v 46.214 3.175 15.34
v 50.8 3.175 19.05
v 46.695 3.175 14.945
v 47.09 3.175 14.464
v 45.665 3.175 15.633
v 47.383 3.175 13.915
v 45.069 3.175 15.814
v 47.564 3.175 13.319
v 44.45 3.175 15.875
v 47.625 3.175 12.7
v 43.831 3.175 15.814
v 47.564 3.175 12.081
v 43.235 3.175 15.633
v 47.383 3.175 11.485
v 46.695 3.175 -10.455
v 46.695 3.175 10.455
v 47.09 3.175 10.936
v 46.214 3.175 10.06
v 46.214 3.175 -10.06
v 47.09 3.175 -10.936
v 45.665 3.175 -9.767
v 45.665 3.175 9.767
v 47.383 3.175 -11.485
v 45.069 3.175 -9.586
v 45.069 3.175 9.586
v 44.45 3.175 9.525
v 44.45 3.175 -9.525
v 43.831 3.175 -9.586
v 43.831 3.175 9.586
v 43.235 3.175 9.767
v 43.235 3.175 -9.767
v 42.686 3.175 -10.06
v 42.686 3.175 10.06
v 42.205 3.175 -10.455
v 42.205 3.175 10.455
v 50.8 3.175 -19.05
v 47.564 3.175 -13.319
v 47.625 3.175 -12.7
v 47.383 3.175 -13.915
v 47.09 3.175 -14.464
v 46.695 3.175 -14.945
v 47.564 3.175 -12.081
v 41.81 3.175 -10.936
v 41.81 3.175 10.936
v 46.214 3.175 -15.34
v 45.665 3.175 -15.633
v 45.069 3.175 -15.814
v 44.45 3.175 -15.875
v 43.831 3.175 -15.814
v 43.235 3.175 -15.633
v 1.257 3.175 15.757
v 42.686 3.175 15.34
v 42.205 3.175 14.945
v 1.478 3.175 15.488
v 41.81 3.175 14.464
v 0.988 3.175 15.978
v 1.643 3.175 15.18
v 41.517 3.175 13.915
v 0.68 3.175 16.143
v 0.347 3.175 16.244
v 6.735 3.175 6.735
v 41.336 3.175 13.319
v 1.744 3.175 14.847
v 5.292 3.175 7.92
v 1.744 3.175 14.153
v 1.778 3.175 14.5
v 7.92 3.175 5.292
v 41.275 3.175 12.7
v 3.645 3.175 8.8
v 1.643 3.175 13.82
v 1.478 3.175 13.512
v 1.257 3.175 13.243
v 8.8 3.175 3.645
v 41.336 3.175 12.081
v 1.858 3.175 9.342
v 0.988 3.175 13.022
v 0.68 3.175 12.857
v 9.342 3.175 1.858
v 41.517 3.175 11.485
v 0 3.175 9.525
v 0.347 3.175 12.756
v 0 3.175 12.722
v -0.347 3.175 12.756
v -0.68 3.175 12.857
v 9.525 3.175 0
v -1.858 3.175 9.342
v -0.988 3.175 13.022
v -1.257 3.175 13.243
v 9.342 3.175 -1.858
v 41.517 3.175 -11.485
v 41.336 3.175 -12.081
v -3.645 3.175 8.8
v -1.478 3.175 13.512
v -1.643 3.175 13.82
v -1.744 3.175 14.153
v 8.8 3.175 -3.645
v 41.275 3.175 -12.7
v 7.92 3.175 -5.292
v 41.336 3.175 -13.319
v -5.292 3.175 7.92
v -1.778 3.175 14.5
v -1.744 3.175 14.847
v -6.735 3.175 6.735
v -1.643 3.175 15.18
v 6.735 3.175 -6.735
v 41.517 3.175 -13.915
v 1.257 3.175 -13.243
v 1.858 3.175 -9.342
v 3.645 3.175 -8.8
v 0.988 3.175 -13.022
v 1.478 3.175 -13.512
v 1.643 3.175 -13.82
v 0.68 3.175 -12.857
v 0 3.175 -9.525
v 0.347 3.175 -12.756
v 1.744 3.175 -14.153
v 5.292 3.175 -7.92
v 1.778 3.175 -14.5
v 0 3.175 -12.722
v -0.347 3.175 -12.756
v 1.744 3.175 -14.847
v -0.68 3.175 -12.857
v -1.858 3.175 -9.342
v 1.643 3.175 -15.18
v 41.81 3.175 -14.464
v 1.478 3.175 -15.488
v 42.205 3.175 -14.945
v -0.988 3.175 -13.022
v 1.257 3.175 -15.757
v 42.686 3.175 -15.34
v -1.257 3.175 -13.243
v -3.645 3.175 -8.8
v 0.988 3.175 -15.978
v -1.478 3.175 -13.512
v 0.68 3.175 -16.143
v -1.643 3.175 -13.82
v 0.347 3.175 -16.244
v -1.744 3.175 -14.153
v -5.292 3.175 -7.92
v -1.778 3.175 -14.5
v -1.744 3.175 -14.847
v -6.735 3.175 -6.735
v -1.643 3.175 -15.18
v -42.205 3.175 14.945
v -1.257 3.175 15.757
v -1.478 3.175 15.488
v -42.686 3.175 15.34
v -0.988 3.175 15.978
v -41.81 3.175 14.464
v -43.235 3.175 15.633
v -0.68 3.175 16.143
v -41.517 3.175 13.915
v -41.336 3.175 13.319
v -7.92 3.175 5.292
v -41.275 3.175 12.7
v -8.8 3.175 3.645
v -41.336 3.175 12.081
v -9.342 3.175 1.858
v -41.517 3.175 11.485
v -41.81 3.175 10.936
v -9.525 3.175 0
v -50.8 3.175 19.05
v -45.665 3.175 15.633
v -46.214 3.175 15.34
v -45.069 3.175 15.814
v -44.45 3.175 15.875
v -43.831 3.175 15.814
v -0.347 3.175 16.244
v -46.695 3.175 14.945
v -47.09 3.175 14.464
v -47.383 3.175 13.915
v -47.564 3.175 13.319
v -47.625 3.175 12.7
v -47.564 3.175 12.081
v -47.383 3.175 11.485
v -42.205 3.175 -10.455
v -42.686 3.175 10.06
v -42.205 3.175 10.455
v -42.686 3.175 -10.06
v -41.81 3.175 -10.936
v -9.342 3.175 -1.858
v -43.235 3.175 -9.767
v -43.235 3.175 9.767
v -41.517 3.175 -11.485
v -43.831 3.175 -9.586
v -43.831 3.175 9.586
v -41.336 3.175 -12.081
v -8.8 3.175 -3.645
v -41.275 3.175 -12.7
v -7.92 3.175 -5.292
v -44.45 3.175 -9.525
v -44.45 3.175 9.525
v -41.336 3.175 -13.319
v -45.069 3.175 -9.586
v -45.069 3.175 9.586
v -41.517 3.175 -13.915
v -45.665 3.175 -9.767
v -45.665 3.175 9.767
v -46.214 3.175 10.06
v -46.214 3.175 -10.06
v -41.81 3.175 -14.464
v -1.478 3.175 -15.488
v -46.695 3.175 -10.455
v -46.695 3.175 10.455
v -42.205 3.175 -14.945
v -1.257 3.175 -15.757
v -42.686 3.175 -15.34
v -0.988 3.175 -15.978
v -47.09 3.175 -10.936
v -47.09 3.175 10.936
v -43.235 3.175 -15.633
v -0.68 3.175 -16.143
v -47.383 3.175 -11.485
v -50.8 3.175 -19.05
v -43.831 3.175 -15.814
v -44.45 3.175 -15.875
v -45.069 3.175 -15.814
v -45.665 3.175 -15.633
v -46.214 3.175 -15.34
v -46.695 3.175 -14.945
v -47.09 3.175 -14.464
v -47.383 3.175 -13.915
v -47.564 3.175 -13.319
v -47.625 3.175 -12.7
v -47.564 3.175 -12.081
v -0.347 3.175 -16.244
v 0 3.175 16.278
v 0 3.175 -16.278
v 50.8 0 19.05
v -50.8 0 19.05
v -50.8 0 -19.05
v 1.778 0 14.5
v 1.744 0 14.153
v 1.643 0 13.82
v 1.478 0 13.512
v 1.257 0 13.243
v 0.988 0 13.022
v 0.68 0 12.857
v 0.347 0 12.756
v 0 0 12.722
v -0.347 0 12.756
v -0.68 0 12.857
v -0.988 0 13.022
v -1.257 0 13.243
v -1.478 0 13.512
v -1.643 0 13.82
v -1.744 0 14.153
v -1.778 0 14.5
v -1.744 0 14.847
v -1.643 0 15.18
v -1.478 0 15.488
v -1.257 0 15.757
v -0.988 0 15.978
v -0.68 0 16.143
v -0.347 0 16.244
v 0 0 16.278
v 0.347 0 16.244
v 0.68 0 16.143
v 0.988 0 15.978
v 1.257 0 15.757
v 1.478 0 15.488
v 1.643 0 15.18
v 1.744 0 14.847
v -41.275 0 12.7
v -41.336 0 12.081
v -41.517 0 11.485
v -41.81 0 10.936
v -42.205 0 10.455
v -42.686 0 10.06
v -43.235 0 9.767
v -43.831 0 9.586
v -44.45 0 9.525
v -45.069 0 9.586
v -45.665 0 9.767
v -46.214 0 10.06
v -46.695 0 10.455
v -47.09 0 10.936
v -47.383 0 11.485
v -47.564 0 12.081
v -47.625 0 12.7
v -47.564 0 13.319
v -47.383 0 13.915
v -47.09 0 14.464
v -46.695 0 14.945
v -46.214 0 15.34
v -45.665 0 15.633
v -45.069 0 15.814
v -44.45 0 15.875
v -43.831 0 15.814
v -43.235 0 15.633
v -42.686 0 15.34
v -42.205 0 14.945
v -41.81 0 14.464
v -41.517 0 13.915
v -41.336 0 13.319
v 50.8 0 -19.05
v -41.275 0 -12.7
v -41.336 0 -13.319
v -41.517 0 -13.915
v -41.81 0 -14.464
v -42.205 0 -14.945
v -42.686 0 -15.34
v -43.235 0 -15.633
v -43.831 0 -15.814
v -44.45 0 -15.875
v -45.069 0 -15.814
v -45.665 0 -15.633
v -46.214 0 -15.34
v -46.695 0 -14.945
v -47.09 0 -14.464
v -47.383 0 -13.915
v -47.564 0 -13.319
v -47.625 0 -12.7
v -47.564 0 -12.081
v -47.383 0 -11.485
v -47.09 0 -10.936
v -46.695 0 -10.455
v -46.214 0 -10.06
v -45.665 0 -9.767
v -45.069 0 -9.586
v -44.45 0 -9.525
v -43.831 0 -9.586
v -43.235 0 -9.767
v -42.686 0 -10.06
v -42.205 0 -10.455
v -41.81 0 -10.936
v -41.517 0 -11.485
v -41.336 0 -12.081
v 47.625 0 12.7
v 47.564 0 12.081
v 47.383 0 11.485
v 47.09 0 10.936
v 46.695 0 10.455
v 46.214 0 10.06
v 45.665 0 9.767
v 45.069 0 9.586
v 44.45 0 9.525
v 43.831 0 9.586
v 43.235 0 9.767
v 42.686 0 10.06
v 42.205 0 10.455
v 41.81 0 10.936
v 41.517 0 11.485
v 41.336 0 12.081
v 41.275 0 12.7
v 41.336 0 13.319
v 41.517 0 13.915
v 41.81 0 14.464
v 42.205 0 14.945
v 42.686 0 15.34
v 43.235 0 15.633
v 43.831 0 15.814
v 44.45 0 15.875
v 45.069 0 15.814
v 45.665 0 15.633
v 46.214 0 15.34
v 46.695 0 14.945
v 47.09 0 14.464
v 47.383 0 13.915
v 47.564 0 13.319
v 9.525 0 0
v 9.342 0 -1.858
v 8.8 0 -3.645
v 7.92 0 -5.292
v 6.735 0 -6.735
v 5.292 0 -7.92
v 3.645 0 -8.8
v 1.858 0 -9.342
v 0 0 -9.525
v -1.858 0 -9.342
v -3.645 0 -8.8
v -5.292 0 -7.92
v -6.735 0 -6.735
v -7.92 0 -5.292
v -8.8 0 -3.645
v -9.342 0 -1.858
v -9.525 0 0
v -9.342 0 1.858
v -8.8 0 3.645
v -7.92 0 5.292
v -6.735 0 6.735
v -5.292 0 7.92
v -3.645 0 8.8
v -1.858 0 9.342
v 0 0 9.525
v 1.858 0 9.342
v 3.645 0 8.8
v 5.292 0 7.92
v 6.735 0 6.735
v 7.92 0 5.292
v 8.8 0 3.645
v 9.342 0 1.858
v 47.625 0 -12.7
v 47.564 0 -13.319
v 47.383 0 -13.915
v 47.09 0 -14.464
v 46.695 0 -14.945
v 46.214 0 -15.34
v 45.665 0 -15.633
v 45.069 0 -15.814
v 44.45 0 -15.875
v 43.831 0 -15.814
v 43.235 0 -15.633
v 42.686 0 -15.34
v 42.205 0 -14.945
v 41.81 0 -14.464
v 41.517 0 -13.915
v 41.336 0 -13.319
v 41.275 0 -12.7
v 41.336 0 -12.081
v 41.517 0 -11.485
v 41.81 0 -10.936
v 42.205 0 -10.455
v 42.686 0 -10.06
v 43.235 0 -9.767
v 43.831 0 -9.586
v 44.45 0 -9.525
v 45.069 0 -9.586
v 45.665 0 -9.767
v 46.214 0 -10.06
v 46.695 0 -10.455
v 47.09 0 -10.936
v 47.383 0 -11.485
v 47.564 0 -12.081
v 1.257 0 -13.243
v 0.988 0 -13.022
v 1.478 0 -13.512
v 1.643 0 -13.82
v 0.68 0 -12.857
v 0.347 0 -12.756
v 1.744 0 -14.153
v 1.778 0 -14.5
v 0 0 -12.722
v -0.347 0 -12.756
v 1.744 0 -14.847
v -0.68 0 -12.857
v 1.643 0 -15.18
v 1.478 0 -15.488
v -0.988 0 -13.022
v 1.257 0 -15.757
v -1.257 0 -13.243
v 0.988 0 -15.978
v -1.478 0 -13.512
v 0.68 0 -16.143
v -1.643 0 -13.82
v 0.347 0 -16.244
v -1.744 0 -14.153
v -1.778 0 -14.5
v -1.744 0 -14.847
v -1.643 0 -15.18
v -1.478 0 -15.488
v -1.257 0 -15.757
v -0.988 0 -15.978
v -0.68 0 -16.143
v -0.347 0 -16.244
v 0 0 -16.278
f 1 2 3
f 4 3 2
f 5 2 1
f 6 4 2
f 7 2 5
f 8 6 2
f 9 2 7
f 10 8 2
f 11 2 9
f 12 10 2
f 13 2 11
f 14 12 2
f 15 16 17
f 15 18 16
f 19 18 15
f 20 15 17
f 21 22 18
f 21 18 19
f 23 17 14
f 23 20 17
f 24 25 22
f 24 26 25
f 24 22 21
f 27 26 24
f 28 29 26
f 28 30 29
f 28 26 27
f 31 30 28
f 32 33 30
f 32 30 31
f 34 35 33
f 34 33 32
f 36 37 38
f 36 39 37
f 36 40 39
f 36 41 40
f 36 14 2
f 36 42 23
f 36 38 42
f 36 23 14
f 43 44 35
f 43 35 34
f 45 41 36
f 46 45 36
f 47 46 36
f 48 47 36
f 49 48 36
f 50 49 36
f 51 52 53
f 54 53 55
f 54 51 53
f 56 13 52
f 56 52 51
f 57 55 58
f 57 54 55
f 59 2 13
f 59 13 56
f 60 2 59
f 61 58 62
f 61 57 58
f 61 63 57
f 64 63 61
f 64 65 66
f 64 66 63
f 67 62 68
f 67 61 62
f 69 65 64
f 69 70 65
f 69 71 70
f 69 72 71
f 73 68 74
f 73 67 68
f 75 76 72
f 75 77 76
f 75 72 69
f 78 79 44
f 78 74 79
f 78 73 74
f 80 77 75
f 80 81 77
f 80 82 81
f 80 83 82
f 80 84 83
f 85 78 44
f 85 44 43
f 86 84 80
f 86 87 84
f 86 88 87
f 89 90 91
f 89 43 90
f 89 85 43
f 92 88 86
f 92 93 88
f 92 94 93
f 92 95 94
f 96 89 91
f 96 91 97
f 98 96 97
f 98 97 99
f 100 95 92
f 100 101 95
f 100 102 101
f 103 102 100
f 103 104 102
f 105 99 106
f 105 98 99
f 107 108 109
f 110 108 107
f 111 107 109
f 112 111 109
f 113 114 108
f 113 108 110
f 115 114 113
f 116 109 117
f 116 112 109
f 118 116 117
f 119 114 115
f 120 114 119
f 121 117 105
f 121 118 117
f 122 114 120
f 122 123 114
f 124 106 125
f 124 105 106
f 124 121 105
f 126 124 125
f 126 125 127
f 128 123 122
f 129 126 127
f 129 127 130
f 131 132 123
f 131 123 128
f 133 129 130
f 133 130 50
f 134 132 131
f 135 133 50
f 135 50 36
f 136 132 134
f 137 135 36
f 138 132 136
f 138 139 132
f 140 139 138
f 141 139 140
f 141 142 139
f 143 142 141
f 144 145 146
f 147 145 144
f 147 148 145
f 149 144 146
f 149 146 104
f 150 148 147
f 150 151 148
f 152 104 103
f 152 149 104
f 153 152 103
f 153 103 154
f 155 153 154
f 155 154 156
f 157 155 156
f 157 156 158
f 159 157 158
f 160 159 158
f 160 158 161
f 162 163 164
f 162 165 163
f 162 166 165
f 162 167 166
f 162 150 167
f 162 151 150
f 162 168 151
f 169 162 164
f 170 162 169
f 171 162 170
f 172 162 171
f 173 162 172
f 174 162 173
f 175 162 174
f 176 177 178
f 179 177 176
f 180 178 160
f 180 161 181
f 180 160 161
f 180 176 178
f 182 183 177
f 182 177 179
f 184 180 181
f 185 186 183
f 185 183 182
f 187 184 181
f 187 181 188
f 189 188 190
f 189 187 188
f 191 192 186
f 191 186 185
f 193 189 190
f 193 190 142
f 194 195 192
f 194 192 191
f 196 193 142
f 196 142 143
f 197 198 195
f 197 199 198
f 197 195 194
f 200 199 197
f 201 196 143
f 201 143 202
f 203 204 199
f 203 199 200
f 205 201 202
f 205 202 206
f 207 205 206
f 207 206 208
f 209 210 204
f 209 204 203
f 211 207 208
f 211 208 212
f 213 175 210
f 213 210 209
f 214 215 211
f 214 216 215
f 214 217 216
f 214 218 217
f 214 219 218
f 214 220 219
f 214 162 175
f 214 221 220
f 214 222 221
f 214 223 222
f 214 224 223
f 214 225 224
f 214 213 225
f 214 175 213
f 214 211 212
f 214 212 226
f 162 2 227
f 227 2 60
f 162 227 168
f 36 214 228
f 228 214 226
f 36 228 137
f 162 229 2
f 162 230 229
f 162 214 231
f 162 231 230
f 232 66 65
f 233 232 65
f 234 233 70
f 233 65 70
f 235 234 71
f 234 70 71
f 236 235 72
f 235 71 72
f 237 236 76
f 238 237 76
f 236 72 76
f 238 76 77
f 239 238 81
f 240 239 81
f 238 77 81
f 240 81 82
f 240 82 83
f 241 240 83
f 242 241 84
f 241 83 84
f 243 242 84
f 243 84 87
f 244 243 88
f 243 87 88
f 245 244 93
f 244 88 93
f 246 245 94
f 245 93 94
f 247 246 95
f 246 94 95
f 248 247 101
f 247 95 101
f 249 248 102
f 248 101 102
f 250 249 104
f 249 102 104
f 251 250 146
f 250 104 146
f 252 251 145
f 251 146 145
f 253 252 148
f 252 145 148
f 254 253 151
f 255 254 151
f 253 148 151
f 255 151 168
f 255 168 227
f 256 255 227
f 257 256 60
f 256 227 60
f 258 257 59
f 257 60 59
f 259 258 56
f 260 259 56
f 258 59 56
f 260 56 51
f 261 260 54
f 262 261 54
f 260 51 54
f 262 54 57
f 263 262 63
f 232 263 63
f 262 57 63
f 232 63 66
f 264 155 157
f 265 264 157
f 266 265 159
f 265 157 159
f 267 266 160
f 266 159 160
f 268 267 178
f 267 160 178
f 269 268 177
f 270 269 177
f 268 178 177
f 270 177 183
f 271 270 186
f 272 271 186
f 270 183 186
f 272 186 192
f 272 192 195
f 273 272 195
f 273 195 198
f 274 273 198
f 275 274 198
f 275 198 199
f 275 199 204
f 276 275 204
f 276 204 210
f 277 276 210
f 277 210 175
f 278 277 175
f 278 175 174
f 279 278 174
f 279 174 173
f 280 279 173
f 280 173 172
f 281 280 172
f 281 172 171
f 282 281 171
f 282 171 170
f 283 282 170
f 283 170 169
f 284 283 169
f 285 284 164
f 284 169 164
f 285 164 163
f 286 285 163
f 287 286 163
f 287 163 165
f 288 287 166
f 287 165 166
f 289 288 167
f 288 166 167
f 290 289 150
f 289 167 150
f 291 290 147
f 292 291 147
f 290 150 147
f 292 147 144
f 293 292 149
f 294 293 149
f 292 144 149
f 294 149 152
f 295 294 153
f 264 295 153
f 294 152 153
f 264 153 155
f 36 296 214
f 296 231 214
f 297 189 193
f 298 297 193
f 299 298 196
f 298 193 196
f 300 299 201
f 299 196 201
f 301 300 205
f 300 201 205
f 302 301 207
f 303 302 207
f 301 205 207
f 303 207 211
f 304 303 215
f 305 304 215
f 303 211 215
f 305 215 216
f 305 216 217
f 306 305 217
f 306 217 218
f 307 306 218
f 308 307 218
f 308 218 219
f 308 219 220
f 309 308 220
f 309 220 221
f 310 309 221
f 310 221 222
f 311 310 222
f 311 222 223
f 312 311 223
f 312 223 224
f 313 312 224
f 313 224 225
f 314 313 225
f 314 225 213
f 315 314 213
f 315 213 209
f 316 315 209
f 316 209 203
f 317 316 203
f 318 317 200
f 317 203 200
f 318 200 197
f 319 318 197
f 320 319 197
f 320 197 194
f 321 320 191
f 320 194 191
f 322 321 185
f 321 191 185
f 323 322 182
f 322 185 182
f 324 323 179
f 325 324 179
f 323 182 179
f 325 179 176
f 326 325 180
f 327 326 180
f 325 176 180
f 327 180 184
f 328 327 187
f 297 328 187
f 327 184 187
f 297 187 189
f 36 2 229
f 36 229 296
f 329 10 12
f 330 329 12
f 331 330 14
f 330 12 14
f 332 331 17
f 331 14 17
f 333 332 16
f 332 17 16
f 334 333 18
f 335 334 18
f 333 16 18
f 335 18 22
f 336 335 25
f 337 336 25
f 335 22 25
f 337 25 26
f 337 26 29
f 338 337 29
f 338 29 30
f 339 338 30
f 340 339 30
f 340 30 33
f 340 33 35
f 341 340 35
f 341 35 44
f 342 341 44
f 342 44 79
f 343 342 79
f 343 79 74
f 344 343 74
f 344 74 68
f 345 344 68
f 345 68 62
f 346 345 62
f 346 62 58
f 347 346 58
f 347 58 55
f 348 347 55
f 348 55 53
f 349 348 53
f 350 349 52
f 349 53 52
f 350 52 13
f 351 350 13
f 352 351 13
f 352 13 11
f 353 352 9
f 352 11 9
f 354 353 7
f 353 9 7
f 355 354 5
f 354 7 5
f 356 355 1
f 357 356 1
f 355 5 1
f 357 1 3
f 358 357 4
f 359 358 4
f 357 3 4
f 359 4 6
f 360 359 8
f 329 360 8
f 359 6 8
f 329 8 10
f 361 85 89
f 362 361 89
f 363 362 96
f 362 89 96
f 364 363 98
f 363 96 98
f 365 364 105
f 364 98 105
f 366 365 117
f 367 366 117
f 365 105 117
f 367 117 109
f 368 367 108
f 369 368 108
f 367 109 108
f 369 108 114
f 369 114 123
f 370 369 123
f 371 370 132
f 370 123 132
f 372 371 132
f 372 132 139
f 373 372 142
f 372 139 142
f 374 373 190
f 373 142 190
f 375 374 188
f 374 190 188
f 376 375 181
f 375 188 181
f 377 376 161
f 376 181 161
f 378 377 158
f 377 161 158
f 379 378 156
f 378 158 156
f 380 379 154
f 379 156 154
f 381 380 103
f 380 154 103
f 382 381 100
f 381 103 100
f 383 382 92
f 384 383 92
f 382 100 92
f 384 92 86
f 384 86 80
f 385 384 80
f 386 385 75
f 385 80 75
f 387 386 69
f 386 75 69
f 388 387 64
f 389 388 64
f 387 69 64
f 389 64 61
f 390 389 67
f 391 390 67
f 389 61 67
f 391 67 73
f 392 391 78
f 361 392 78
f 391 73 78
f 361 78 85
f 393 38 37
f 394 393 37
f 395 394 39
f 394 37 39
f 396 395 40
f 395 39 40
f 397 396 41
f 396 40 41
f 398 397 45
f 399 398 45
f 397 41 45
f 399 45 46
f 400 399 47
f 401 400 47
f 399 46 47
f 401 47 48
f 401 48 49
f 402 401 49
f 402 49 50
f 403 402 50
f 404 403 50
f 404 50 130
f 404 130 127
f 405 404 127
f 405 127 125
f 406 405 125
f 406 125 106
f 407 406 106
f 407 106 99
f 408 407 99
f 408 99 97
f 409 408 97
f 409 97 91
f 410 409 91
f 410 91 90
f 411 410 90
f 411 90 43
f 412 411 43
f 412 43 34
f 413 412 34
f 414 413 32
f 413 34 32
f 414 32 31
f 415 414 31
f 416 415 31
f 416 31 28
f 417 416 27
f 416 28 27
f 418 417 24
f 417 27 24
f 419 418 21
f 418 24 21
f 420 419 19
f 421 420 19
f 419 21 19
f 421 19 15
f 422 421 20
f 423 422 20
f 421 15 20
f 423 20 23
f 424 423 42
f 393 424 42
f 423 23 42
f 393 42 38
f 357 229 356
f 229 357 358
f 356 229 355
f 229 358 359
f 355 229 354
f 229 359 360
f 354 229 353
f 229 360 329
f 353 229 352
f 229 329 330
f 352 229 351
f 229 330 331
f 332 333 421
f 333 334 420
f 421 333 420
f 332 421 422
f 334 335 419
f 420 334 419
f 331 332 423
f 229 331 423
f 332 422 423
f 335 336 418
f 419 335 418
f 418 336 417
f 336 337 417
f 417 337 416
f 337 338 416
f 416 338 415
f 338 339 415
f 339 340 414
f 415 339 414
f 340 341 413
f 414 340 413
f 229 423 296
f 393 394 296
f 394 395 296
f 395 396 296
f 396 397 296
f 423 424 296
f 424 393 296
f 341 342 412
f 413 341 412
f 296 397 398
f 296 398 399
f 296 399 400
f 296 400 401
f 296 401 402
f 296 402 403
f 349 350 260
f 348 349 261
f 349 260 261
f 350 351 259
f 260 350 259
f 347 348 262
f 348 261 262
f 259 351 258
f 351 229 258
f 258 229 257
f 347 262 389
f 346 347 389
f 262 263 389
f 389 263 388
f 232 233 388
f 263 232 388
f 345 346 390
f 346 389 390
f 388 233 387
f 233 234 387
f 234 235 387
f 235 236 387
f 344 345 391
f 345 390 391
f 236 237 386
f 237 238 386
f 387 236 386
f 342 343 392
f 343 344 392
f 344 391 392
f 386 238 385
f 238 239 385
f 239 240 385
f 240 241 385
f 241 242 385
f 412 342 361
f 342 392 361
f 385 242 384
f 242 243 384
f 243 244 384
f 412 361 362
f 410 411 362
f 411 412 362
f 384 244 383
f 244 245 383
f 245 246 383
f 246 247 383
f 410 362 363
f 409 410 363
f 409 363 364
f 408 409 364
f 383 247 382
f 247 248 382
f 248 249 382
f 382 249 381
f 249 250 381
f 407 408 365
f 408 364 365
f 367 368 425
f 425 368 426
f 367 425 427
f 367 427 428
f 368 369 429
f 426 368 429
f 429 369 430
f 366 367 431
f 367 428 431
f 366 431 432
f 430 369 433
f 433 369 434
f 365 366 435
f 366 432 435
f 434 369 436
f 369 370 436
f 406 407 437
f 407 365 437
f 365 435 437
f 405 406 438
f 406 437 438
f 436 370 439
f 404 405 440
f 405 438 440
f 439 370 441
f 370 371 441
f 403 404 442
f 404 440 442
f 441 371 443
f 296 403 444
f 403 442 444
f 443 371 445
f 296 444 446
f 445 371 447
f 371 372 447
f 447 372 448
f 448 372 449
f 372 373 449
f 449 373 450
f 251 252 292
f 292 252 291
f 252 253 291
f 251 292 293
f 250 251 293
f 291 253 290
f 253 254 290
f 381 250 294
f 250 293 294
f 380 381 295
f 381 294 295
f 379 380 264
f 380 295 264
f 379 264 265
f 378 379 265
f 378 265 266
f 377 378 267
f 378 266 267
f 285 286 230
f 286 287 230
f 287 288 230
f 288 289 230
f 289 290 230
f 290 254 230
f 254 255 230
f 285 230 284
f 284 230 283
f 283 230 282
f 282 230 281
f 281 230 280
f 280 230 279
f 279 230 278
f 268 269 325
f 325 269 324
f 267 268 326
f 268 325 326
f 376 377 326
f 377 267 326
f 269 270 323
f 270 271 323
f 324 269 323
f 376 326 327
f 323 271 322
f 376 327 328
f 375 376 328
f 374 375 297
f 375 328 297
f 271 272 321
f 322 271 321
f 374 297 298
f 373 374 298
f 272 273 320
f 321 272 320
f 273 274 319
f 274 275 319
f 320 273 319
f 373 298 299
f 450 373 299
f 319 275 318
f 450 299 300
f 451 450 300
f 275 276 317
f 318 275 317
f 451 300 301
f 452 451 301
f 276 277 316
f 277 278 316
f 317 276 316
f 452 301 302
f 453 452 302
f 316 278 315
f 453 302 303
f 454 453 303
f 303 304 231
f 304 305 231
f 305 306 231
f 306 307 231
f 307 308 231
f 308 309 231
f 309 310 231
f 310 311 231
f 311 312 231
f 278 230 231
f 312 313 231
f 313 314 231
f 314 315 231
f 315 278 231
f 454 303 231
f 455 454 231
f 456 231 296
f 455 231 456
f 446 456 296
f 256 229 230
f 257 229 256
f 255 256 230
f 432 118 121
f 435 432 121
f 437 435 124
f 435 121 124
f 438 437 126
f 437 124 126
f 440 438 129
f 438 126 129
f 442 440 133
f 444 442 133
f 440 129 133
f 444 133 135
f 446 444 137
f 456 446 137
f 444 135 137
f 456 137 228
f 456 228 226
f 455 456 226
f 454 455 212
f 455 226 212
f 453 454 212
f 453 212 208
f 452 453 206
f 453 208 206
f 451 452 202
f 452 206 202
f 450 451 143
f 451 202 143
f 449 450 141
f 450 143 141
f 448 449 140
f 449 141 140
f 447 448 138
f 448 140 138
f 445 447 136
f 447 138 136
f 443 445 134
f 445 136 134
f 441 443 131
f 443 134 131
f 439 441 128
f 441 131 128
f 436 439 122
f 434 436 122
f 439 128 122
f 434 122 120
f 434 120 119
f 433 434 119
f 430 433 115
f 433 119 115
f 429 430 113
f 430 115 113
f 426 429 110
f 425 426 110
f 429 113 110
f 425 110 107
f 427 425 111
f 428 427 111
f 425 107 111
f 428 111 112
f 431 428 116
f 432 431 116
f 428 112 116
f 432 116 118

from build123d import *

# Parameters (mm, degrees)
SKETCH1_W           = 25.4
SKETCH1_H           = 38.1
BOSS_EXTRUDE1_DEPTH = 3.175
SKETCH2_R           = 9.525
SKETCH2_R_2         = 1.778
CUT_EXTRUDE1_DEPTH  = 3.175
SKETCH3_W           = 38.1
SKETCH3_H           = 3.175
BOSS_EXTRUDE2_DEPTH = 38.1
SKETCH6_W           = 38.1
SKETCH6_H           = 3.175
BOSS_EXTRUDE4_DEPTH = 38.1
SKETCH4_R           = 3.175
CUT_EXTRUDE2_DEPTH  = 4.175


with BuildPart() as part:
    # Sketch1 → Boss-Extrude1 (new body)
    with BuildSketch(Plane(origin=(0, 0, 0), x_dir=(1, 0, 0), z_dir=(0, 1, 0))):
        Rectangle(SKETCH1_W, SKETCH1_H)
    extrude(amount=BOSS_EXTRUDE1_DEPTH)

    # Sketch2 → Cut-Extrude1 (cut)
    with BuildSketch(Plane(origin=(0, 3.175, 0), x_dir=(1, 0, 0), z_dir=(0, 1, 0))):
        Circle(SKETCH2_R)
        with Locations((0, -14.5)):
            Circle(SKETCH2_R_2)
        with Locations((0, 14.5)):
            Circle(SKETCH2_R_2)
    extrude(amount=-CUT_EXTRUDE1_DEPTH, mode=Mode.SUBTRACT)

    # Sketch3 → Boss-Extrude2 (add)
    with BuildSketch(Plane.ZY.offset(12.7)):
        with Locations((0, 1.5875)):
            Rectangle(SKETCH3_W, SKETCH3_H)
    extrude(amount=BOSS_EXTRUDE2_DEPTH)

    # Sketch6 → Boss-Extrude4 (add)
    with BuildSketch(Plane(origin=(12.7, 0, 0), x_dir=(0, 0, -1), z_dir=(1, 0, 0))):
        with Locations((0, 1.5875)):
            Rectangle(SKETCH6_W, SKETCH6_H)
    extrude(amount=BOSS_EXTRUDE4_DEPTH)

    # Sketch4 → Cut-Extrude2 (cut, through all)
    with BuildSketch(Plane(origin=(0, 3.175, 0), x_dir=(1, 0, 0), z_dir=(0, 1, 0))):
        with Locations((-44.45, 12.7)):
            Circle(SKETCH4_R)
        with Locations((-44.45, -12.7)):
            Circle(SKETCH4_R)
        with Locations((44.45, -12.7)):
            Circle(SKETCH4_R)
        with Locations((44.45, 12.7)):
            Circle(SKETCH4_R)
    extrude(amount=-CUT_EXTRUDE2_DEPTH, mode=Mode.SUBTRACT)


solid = part.part
